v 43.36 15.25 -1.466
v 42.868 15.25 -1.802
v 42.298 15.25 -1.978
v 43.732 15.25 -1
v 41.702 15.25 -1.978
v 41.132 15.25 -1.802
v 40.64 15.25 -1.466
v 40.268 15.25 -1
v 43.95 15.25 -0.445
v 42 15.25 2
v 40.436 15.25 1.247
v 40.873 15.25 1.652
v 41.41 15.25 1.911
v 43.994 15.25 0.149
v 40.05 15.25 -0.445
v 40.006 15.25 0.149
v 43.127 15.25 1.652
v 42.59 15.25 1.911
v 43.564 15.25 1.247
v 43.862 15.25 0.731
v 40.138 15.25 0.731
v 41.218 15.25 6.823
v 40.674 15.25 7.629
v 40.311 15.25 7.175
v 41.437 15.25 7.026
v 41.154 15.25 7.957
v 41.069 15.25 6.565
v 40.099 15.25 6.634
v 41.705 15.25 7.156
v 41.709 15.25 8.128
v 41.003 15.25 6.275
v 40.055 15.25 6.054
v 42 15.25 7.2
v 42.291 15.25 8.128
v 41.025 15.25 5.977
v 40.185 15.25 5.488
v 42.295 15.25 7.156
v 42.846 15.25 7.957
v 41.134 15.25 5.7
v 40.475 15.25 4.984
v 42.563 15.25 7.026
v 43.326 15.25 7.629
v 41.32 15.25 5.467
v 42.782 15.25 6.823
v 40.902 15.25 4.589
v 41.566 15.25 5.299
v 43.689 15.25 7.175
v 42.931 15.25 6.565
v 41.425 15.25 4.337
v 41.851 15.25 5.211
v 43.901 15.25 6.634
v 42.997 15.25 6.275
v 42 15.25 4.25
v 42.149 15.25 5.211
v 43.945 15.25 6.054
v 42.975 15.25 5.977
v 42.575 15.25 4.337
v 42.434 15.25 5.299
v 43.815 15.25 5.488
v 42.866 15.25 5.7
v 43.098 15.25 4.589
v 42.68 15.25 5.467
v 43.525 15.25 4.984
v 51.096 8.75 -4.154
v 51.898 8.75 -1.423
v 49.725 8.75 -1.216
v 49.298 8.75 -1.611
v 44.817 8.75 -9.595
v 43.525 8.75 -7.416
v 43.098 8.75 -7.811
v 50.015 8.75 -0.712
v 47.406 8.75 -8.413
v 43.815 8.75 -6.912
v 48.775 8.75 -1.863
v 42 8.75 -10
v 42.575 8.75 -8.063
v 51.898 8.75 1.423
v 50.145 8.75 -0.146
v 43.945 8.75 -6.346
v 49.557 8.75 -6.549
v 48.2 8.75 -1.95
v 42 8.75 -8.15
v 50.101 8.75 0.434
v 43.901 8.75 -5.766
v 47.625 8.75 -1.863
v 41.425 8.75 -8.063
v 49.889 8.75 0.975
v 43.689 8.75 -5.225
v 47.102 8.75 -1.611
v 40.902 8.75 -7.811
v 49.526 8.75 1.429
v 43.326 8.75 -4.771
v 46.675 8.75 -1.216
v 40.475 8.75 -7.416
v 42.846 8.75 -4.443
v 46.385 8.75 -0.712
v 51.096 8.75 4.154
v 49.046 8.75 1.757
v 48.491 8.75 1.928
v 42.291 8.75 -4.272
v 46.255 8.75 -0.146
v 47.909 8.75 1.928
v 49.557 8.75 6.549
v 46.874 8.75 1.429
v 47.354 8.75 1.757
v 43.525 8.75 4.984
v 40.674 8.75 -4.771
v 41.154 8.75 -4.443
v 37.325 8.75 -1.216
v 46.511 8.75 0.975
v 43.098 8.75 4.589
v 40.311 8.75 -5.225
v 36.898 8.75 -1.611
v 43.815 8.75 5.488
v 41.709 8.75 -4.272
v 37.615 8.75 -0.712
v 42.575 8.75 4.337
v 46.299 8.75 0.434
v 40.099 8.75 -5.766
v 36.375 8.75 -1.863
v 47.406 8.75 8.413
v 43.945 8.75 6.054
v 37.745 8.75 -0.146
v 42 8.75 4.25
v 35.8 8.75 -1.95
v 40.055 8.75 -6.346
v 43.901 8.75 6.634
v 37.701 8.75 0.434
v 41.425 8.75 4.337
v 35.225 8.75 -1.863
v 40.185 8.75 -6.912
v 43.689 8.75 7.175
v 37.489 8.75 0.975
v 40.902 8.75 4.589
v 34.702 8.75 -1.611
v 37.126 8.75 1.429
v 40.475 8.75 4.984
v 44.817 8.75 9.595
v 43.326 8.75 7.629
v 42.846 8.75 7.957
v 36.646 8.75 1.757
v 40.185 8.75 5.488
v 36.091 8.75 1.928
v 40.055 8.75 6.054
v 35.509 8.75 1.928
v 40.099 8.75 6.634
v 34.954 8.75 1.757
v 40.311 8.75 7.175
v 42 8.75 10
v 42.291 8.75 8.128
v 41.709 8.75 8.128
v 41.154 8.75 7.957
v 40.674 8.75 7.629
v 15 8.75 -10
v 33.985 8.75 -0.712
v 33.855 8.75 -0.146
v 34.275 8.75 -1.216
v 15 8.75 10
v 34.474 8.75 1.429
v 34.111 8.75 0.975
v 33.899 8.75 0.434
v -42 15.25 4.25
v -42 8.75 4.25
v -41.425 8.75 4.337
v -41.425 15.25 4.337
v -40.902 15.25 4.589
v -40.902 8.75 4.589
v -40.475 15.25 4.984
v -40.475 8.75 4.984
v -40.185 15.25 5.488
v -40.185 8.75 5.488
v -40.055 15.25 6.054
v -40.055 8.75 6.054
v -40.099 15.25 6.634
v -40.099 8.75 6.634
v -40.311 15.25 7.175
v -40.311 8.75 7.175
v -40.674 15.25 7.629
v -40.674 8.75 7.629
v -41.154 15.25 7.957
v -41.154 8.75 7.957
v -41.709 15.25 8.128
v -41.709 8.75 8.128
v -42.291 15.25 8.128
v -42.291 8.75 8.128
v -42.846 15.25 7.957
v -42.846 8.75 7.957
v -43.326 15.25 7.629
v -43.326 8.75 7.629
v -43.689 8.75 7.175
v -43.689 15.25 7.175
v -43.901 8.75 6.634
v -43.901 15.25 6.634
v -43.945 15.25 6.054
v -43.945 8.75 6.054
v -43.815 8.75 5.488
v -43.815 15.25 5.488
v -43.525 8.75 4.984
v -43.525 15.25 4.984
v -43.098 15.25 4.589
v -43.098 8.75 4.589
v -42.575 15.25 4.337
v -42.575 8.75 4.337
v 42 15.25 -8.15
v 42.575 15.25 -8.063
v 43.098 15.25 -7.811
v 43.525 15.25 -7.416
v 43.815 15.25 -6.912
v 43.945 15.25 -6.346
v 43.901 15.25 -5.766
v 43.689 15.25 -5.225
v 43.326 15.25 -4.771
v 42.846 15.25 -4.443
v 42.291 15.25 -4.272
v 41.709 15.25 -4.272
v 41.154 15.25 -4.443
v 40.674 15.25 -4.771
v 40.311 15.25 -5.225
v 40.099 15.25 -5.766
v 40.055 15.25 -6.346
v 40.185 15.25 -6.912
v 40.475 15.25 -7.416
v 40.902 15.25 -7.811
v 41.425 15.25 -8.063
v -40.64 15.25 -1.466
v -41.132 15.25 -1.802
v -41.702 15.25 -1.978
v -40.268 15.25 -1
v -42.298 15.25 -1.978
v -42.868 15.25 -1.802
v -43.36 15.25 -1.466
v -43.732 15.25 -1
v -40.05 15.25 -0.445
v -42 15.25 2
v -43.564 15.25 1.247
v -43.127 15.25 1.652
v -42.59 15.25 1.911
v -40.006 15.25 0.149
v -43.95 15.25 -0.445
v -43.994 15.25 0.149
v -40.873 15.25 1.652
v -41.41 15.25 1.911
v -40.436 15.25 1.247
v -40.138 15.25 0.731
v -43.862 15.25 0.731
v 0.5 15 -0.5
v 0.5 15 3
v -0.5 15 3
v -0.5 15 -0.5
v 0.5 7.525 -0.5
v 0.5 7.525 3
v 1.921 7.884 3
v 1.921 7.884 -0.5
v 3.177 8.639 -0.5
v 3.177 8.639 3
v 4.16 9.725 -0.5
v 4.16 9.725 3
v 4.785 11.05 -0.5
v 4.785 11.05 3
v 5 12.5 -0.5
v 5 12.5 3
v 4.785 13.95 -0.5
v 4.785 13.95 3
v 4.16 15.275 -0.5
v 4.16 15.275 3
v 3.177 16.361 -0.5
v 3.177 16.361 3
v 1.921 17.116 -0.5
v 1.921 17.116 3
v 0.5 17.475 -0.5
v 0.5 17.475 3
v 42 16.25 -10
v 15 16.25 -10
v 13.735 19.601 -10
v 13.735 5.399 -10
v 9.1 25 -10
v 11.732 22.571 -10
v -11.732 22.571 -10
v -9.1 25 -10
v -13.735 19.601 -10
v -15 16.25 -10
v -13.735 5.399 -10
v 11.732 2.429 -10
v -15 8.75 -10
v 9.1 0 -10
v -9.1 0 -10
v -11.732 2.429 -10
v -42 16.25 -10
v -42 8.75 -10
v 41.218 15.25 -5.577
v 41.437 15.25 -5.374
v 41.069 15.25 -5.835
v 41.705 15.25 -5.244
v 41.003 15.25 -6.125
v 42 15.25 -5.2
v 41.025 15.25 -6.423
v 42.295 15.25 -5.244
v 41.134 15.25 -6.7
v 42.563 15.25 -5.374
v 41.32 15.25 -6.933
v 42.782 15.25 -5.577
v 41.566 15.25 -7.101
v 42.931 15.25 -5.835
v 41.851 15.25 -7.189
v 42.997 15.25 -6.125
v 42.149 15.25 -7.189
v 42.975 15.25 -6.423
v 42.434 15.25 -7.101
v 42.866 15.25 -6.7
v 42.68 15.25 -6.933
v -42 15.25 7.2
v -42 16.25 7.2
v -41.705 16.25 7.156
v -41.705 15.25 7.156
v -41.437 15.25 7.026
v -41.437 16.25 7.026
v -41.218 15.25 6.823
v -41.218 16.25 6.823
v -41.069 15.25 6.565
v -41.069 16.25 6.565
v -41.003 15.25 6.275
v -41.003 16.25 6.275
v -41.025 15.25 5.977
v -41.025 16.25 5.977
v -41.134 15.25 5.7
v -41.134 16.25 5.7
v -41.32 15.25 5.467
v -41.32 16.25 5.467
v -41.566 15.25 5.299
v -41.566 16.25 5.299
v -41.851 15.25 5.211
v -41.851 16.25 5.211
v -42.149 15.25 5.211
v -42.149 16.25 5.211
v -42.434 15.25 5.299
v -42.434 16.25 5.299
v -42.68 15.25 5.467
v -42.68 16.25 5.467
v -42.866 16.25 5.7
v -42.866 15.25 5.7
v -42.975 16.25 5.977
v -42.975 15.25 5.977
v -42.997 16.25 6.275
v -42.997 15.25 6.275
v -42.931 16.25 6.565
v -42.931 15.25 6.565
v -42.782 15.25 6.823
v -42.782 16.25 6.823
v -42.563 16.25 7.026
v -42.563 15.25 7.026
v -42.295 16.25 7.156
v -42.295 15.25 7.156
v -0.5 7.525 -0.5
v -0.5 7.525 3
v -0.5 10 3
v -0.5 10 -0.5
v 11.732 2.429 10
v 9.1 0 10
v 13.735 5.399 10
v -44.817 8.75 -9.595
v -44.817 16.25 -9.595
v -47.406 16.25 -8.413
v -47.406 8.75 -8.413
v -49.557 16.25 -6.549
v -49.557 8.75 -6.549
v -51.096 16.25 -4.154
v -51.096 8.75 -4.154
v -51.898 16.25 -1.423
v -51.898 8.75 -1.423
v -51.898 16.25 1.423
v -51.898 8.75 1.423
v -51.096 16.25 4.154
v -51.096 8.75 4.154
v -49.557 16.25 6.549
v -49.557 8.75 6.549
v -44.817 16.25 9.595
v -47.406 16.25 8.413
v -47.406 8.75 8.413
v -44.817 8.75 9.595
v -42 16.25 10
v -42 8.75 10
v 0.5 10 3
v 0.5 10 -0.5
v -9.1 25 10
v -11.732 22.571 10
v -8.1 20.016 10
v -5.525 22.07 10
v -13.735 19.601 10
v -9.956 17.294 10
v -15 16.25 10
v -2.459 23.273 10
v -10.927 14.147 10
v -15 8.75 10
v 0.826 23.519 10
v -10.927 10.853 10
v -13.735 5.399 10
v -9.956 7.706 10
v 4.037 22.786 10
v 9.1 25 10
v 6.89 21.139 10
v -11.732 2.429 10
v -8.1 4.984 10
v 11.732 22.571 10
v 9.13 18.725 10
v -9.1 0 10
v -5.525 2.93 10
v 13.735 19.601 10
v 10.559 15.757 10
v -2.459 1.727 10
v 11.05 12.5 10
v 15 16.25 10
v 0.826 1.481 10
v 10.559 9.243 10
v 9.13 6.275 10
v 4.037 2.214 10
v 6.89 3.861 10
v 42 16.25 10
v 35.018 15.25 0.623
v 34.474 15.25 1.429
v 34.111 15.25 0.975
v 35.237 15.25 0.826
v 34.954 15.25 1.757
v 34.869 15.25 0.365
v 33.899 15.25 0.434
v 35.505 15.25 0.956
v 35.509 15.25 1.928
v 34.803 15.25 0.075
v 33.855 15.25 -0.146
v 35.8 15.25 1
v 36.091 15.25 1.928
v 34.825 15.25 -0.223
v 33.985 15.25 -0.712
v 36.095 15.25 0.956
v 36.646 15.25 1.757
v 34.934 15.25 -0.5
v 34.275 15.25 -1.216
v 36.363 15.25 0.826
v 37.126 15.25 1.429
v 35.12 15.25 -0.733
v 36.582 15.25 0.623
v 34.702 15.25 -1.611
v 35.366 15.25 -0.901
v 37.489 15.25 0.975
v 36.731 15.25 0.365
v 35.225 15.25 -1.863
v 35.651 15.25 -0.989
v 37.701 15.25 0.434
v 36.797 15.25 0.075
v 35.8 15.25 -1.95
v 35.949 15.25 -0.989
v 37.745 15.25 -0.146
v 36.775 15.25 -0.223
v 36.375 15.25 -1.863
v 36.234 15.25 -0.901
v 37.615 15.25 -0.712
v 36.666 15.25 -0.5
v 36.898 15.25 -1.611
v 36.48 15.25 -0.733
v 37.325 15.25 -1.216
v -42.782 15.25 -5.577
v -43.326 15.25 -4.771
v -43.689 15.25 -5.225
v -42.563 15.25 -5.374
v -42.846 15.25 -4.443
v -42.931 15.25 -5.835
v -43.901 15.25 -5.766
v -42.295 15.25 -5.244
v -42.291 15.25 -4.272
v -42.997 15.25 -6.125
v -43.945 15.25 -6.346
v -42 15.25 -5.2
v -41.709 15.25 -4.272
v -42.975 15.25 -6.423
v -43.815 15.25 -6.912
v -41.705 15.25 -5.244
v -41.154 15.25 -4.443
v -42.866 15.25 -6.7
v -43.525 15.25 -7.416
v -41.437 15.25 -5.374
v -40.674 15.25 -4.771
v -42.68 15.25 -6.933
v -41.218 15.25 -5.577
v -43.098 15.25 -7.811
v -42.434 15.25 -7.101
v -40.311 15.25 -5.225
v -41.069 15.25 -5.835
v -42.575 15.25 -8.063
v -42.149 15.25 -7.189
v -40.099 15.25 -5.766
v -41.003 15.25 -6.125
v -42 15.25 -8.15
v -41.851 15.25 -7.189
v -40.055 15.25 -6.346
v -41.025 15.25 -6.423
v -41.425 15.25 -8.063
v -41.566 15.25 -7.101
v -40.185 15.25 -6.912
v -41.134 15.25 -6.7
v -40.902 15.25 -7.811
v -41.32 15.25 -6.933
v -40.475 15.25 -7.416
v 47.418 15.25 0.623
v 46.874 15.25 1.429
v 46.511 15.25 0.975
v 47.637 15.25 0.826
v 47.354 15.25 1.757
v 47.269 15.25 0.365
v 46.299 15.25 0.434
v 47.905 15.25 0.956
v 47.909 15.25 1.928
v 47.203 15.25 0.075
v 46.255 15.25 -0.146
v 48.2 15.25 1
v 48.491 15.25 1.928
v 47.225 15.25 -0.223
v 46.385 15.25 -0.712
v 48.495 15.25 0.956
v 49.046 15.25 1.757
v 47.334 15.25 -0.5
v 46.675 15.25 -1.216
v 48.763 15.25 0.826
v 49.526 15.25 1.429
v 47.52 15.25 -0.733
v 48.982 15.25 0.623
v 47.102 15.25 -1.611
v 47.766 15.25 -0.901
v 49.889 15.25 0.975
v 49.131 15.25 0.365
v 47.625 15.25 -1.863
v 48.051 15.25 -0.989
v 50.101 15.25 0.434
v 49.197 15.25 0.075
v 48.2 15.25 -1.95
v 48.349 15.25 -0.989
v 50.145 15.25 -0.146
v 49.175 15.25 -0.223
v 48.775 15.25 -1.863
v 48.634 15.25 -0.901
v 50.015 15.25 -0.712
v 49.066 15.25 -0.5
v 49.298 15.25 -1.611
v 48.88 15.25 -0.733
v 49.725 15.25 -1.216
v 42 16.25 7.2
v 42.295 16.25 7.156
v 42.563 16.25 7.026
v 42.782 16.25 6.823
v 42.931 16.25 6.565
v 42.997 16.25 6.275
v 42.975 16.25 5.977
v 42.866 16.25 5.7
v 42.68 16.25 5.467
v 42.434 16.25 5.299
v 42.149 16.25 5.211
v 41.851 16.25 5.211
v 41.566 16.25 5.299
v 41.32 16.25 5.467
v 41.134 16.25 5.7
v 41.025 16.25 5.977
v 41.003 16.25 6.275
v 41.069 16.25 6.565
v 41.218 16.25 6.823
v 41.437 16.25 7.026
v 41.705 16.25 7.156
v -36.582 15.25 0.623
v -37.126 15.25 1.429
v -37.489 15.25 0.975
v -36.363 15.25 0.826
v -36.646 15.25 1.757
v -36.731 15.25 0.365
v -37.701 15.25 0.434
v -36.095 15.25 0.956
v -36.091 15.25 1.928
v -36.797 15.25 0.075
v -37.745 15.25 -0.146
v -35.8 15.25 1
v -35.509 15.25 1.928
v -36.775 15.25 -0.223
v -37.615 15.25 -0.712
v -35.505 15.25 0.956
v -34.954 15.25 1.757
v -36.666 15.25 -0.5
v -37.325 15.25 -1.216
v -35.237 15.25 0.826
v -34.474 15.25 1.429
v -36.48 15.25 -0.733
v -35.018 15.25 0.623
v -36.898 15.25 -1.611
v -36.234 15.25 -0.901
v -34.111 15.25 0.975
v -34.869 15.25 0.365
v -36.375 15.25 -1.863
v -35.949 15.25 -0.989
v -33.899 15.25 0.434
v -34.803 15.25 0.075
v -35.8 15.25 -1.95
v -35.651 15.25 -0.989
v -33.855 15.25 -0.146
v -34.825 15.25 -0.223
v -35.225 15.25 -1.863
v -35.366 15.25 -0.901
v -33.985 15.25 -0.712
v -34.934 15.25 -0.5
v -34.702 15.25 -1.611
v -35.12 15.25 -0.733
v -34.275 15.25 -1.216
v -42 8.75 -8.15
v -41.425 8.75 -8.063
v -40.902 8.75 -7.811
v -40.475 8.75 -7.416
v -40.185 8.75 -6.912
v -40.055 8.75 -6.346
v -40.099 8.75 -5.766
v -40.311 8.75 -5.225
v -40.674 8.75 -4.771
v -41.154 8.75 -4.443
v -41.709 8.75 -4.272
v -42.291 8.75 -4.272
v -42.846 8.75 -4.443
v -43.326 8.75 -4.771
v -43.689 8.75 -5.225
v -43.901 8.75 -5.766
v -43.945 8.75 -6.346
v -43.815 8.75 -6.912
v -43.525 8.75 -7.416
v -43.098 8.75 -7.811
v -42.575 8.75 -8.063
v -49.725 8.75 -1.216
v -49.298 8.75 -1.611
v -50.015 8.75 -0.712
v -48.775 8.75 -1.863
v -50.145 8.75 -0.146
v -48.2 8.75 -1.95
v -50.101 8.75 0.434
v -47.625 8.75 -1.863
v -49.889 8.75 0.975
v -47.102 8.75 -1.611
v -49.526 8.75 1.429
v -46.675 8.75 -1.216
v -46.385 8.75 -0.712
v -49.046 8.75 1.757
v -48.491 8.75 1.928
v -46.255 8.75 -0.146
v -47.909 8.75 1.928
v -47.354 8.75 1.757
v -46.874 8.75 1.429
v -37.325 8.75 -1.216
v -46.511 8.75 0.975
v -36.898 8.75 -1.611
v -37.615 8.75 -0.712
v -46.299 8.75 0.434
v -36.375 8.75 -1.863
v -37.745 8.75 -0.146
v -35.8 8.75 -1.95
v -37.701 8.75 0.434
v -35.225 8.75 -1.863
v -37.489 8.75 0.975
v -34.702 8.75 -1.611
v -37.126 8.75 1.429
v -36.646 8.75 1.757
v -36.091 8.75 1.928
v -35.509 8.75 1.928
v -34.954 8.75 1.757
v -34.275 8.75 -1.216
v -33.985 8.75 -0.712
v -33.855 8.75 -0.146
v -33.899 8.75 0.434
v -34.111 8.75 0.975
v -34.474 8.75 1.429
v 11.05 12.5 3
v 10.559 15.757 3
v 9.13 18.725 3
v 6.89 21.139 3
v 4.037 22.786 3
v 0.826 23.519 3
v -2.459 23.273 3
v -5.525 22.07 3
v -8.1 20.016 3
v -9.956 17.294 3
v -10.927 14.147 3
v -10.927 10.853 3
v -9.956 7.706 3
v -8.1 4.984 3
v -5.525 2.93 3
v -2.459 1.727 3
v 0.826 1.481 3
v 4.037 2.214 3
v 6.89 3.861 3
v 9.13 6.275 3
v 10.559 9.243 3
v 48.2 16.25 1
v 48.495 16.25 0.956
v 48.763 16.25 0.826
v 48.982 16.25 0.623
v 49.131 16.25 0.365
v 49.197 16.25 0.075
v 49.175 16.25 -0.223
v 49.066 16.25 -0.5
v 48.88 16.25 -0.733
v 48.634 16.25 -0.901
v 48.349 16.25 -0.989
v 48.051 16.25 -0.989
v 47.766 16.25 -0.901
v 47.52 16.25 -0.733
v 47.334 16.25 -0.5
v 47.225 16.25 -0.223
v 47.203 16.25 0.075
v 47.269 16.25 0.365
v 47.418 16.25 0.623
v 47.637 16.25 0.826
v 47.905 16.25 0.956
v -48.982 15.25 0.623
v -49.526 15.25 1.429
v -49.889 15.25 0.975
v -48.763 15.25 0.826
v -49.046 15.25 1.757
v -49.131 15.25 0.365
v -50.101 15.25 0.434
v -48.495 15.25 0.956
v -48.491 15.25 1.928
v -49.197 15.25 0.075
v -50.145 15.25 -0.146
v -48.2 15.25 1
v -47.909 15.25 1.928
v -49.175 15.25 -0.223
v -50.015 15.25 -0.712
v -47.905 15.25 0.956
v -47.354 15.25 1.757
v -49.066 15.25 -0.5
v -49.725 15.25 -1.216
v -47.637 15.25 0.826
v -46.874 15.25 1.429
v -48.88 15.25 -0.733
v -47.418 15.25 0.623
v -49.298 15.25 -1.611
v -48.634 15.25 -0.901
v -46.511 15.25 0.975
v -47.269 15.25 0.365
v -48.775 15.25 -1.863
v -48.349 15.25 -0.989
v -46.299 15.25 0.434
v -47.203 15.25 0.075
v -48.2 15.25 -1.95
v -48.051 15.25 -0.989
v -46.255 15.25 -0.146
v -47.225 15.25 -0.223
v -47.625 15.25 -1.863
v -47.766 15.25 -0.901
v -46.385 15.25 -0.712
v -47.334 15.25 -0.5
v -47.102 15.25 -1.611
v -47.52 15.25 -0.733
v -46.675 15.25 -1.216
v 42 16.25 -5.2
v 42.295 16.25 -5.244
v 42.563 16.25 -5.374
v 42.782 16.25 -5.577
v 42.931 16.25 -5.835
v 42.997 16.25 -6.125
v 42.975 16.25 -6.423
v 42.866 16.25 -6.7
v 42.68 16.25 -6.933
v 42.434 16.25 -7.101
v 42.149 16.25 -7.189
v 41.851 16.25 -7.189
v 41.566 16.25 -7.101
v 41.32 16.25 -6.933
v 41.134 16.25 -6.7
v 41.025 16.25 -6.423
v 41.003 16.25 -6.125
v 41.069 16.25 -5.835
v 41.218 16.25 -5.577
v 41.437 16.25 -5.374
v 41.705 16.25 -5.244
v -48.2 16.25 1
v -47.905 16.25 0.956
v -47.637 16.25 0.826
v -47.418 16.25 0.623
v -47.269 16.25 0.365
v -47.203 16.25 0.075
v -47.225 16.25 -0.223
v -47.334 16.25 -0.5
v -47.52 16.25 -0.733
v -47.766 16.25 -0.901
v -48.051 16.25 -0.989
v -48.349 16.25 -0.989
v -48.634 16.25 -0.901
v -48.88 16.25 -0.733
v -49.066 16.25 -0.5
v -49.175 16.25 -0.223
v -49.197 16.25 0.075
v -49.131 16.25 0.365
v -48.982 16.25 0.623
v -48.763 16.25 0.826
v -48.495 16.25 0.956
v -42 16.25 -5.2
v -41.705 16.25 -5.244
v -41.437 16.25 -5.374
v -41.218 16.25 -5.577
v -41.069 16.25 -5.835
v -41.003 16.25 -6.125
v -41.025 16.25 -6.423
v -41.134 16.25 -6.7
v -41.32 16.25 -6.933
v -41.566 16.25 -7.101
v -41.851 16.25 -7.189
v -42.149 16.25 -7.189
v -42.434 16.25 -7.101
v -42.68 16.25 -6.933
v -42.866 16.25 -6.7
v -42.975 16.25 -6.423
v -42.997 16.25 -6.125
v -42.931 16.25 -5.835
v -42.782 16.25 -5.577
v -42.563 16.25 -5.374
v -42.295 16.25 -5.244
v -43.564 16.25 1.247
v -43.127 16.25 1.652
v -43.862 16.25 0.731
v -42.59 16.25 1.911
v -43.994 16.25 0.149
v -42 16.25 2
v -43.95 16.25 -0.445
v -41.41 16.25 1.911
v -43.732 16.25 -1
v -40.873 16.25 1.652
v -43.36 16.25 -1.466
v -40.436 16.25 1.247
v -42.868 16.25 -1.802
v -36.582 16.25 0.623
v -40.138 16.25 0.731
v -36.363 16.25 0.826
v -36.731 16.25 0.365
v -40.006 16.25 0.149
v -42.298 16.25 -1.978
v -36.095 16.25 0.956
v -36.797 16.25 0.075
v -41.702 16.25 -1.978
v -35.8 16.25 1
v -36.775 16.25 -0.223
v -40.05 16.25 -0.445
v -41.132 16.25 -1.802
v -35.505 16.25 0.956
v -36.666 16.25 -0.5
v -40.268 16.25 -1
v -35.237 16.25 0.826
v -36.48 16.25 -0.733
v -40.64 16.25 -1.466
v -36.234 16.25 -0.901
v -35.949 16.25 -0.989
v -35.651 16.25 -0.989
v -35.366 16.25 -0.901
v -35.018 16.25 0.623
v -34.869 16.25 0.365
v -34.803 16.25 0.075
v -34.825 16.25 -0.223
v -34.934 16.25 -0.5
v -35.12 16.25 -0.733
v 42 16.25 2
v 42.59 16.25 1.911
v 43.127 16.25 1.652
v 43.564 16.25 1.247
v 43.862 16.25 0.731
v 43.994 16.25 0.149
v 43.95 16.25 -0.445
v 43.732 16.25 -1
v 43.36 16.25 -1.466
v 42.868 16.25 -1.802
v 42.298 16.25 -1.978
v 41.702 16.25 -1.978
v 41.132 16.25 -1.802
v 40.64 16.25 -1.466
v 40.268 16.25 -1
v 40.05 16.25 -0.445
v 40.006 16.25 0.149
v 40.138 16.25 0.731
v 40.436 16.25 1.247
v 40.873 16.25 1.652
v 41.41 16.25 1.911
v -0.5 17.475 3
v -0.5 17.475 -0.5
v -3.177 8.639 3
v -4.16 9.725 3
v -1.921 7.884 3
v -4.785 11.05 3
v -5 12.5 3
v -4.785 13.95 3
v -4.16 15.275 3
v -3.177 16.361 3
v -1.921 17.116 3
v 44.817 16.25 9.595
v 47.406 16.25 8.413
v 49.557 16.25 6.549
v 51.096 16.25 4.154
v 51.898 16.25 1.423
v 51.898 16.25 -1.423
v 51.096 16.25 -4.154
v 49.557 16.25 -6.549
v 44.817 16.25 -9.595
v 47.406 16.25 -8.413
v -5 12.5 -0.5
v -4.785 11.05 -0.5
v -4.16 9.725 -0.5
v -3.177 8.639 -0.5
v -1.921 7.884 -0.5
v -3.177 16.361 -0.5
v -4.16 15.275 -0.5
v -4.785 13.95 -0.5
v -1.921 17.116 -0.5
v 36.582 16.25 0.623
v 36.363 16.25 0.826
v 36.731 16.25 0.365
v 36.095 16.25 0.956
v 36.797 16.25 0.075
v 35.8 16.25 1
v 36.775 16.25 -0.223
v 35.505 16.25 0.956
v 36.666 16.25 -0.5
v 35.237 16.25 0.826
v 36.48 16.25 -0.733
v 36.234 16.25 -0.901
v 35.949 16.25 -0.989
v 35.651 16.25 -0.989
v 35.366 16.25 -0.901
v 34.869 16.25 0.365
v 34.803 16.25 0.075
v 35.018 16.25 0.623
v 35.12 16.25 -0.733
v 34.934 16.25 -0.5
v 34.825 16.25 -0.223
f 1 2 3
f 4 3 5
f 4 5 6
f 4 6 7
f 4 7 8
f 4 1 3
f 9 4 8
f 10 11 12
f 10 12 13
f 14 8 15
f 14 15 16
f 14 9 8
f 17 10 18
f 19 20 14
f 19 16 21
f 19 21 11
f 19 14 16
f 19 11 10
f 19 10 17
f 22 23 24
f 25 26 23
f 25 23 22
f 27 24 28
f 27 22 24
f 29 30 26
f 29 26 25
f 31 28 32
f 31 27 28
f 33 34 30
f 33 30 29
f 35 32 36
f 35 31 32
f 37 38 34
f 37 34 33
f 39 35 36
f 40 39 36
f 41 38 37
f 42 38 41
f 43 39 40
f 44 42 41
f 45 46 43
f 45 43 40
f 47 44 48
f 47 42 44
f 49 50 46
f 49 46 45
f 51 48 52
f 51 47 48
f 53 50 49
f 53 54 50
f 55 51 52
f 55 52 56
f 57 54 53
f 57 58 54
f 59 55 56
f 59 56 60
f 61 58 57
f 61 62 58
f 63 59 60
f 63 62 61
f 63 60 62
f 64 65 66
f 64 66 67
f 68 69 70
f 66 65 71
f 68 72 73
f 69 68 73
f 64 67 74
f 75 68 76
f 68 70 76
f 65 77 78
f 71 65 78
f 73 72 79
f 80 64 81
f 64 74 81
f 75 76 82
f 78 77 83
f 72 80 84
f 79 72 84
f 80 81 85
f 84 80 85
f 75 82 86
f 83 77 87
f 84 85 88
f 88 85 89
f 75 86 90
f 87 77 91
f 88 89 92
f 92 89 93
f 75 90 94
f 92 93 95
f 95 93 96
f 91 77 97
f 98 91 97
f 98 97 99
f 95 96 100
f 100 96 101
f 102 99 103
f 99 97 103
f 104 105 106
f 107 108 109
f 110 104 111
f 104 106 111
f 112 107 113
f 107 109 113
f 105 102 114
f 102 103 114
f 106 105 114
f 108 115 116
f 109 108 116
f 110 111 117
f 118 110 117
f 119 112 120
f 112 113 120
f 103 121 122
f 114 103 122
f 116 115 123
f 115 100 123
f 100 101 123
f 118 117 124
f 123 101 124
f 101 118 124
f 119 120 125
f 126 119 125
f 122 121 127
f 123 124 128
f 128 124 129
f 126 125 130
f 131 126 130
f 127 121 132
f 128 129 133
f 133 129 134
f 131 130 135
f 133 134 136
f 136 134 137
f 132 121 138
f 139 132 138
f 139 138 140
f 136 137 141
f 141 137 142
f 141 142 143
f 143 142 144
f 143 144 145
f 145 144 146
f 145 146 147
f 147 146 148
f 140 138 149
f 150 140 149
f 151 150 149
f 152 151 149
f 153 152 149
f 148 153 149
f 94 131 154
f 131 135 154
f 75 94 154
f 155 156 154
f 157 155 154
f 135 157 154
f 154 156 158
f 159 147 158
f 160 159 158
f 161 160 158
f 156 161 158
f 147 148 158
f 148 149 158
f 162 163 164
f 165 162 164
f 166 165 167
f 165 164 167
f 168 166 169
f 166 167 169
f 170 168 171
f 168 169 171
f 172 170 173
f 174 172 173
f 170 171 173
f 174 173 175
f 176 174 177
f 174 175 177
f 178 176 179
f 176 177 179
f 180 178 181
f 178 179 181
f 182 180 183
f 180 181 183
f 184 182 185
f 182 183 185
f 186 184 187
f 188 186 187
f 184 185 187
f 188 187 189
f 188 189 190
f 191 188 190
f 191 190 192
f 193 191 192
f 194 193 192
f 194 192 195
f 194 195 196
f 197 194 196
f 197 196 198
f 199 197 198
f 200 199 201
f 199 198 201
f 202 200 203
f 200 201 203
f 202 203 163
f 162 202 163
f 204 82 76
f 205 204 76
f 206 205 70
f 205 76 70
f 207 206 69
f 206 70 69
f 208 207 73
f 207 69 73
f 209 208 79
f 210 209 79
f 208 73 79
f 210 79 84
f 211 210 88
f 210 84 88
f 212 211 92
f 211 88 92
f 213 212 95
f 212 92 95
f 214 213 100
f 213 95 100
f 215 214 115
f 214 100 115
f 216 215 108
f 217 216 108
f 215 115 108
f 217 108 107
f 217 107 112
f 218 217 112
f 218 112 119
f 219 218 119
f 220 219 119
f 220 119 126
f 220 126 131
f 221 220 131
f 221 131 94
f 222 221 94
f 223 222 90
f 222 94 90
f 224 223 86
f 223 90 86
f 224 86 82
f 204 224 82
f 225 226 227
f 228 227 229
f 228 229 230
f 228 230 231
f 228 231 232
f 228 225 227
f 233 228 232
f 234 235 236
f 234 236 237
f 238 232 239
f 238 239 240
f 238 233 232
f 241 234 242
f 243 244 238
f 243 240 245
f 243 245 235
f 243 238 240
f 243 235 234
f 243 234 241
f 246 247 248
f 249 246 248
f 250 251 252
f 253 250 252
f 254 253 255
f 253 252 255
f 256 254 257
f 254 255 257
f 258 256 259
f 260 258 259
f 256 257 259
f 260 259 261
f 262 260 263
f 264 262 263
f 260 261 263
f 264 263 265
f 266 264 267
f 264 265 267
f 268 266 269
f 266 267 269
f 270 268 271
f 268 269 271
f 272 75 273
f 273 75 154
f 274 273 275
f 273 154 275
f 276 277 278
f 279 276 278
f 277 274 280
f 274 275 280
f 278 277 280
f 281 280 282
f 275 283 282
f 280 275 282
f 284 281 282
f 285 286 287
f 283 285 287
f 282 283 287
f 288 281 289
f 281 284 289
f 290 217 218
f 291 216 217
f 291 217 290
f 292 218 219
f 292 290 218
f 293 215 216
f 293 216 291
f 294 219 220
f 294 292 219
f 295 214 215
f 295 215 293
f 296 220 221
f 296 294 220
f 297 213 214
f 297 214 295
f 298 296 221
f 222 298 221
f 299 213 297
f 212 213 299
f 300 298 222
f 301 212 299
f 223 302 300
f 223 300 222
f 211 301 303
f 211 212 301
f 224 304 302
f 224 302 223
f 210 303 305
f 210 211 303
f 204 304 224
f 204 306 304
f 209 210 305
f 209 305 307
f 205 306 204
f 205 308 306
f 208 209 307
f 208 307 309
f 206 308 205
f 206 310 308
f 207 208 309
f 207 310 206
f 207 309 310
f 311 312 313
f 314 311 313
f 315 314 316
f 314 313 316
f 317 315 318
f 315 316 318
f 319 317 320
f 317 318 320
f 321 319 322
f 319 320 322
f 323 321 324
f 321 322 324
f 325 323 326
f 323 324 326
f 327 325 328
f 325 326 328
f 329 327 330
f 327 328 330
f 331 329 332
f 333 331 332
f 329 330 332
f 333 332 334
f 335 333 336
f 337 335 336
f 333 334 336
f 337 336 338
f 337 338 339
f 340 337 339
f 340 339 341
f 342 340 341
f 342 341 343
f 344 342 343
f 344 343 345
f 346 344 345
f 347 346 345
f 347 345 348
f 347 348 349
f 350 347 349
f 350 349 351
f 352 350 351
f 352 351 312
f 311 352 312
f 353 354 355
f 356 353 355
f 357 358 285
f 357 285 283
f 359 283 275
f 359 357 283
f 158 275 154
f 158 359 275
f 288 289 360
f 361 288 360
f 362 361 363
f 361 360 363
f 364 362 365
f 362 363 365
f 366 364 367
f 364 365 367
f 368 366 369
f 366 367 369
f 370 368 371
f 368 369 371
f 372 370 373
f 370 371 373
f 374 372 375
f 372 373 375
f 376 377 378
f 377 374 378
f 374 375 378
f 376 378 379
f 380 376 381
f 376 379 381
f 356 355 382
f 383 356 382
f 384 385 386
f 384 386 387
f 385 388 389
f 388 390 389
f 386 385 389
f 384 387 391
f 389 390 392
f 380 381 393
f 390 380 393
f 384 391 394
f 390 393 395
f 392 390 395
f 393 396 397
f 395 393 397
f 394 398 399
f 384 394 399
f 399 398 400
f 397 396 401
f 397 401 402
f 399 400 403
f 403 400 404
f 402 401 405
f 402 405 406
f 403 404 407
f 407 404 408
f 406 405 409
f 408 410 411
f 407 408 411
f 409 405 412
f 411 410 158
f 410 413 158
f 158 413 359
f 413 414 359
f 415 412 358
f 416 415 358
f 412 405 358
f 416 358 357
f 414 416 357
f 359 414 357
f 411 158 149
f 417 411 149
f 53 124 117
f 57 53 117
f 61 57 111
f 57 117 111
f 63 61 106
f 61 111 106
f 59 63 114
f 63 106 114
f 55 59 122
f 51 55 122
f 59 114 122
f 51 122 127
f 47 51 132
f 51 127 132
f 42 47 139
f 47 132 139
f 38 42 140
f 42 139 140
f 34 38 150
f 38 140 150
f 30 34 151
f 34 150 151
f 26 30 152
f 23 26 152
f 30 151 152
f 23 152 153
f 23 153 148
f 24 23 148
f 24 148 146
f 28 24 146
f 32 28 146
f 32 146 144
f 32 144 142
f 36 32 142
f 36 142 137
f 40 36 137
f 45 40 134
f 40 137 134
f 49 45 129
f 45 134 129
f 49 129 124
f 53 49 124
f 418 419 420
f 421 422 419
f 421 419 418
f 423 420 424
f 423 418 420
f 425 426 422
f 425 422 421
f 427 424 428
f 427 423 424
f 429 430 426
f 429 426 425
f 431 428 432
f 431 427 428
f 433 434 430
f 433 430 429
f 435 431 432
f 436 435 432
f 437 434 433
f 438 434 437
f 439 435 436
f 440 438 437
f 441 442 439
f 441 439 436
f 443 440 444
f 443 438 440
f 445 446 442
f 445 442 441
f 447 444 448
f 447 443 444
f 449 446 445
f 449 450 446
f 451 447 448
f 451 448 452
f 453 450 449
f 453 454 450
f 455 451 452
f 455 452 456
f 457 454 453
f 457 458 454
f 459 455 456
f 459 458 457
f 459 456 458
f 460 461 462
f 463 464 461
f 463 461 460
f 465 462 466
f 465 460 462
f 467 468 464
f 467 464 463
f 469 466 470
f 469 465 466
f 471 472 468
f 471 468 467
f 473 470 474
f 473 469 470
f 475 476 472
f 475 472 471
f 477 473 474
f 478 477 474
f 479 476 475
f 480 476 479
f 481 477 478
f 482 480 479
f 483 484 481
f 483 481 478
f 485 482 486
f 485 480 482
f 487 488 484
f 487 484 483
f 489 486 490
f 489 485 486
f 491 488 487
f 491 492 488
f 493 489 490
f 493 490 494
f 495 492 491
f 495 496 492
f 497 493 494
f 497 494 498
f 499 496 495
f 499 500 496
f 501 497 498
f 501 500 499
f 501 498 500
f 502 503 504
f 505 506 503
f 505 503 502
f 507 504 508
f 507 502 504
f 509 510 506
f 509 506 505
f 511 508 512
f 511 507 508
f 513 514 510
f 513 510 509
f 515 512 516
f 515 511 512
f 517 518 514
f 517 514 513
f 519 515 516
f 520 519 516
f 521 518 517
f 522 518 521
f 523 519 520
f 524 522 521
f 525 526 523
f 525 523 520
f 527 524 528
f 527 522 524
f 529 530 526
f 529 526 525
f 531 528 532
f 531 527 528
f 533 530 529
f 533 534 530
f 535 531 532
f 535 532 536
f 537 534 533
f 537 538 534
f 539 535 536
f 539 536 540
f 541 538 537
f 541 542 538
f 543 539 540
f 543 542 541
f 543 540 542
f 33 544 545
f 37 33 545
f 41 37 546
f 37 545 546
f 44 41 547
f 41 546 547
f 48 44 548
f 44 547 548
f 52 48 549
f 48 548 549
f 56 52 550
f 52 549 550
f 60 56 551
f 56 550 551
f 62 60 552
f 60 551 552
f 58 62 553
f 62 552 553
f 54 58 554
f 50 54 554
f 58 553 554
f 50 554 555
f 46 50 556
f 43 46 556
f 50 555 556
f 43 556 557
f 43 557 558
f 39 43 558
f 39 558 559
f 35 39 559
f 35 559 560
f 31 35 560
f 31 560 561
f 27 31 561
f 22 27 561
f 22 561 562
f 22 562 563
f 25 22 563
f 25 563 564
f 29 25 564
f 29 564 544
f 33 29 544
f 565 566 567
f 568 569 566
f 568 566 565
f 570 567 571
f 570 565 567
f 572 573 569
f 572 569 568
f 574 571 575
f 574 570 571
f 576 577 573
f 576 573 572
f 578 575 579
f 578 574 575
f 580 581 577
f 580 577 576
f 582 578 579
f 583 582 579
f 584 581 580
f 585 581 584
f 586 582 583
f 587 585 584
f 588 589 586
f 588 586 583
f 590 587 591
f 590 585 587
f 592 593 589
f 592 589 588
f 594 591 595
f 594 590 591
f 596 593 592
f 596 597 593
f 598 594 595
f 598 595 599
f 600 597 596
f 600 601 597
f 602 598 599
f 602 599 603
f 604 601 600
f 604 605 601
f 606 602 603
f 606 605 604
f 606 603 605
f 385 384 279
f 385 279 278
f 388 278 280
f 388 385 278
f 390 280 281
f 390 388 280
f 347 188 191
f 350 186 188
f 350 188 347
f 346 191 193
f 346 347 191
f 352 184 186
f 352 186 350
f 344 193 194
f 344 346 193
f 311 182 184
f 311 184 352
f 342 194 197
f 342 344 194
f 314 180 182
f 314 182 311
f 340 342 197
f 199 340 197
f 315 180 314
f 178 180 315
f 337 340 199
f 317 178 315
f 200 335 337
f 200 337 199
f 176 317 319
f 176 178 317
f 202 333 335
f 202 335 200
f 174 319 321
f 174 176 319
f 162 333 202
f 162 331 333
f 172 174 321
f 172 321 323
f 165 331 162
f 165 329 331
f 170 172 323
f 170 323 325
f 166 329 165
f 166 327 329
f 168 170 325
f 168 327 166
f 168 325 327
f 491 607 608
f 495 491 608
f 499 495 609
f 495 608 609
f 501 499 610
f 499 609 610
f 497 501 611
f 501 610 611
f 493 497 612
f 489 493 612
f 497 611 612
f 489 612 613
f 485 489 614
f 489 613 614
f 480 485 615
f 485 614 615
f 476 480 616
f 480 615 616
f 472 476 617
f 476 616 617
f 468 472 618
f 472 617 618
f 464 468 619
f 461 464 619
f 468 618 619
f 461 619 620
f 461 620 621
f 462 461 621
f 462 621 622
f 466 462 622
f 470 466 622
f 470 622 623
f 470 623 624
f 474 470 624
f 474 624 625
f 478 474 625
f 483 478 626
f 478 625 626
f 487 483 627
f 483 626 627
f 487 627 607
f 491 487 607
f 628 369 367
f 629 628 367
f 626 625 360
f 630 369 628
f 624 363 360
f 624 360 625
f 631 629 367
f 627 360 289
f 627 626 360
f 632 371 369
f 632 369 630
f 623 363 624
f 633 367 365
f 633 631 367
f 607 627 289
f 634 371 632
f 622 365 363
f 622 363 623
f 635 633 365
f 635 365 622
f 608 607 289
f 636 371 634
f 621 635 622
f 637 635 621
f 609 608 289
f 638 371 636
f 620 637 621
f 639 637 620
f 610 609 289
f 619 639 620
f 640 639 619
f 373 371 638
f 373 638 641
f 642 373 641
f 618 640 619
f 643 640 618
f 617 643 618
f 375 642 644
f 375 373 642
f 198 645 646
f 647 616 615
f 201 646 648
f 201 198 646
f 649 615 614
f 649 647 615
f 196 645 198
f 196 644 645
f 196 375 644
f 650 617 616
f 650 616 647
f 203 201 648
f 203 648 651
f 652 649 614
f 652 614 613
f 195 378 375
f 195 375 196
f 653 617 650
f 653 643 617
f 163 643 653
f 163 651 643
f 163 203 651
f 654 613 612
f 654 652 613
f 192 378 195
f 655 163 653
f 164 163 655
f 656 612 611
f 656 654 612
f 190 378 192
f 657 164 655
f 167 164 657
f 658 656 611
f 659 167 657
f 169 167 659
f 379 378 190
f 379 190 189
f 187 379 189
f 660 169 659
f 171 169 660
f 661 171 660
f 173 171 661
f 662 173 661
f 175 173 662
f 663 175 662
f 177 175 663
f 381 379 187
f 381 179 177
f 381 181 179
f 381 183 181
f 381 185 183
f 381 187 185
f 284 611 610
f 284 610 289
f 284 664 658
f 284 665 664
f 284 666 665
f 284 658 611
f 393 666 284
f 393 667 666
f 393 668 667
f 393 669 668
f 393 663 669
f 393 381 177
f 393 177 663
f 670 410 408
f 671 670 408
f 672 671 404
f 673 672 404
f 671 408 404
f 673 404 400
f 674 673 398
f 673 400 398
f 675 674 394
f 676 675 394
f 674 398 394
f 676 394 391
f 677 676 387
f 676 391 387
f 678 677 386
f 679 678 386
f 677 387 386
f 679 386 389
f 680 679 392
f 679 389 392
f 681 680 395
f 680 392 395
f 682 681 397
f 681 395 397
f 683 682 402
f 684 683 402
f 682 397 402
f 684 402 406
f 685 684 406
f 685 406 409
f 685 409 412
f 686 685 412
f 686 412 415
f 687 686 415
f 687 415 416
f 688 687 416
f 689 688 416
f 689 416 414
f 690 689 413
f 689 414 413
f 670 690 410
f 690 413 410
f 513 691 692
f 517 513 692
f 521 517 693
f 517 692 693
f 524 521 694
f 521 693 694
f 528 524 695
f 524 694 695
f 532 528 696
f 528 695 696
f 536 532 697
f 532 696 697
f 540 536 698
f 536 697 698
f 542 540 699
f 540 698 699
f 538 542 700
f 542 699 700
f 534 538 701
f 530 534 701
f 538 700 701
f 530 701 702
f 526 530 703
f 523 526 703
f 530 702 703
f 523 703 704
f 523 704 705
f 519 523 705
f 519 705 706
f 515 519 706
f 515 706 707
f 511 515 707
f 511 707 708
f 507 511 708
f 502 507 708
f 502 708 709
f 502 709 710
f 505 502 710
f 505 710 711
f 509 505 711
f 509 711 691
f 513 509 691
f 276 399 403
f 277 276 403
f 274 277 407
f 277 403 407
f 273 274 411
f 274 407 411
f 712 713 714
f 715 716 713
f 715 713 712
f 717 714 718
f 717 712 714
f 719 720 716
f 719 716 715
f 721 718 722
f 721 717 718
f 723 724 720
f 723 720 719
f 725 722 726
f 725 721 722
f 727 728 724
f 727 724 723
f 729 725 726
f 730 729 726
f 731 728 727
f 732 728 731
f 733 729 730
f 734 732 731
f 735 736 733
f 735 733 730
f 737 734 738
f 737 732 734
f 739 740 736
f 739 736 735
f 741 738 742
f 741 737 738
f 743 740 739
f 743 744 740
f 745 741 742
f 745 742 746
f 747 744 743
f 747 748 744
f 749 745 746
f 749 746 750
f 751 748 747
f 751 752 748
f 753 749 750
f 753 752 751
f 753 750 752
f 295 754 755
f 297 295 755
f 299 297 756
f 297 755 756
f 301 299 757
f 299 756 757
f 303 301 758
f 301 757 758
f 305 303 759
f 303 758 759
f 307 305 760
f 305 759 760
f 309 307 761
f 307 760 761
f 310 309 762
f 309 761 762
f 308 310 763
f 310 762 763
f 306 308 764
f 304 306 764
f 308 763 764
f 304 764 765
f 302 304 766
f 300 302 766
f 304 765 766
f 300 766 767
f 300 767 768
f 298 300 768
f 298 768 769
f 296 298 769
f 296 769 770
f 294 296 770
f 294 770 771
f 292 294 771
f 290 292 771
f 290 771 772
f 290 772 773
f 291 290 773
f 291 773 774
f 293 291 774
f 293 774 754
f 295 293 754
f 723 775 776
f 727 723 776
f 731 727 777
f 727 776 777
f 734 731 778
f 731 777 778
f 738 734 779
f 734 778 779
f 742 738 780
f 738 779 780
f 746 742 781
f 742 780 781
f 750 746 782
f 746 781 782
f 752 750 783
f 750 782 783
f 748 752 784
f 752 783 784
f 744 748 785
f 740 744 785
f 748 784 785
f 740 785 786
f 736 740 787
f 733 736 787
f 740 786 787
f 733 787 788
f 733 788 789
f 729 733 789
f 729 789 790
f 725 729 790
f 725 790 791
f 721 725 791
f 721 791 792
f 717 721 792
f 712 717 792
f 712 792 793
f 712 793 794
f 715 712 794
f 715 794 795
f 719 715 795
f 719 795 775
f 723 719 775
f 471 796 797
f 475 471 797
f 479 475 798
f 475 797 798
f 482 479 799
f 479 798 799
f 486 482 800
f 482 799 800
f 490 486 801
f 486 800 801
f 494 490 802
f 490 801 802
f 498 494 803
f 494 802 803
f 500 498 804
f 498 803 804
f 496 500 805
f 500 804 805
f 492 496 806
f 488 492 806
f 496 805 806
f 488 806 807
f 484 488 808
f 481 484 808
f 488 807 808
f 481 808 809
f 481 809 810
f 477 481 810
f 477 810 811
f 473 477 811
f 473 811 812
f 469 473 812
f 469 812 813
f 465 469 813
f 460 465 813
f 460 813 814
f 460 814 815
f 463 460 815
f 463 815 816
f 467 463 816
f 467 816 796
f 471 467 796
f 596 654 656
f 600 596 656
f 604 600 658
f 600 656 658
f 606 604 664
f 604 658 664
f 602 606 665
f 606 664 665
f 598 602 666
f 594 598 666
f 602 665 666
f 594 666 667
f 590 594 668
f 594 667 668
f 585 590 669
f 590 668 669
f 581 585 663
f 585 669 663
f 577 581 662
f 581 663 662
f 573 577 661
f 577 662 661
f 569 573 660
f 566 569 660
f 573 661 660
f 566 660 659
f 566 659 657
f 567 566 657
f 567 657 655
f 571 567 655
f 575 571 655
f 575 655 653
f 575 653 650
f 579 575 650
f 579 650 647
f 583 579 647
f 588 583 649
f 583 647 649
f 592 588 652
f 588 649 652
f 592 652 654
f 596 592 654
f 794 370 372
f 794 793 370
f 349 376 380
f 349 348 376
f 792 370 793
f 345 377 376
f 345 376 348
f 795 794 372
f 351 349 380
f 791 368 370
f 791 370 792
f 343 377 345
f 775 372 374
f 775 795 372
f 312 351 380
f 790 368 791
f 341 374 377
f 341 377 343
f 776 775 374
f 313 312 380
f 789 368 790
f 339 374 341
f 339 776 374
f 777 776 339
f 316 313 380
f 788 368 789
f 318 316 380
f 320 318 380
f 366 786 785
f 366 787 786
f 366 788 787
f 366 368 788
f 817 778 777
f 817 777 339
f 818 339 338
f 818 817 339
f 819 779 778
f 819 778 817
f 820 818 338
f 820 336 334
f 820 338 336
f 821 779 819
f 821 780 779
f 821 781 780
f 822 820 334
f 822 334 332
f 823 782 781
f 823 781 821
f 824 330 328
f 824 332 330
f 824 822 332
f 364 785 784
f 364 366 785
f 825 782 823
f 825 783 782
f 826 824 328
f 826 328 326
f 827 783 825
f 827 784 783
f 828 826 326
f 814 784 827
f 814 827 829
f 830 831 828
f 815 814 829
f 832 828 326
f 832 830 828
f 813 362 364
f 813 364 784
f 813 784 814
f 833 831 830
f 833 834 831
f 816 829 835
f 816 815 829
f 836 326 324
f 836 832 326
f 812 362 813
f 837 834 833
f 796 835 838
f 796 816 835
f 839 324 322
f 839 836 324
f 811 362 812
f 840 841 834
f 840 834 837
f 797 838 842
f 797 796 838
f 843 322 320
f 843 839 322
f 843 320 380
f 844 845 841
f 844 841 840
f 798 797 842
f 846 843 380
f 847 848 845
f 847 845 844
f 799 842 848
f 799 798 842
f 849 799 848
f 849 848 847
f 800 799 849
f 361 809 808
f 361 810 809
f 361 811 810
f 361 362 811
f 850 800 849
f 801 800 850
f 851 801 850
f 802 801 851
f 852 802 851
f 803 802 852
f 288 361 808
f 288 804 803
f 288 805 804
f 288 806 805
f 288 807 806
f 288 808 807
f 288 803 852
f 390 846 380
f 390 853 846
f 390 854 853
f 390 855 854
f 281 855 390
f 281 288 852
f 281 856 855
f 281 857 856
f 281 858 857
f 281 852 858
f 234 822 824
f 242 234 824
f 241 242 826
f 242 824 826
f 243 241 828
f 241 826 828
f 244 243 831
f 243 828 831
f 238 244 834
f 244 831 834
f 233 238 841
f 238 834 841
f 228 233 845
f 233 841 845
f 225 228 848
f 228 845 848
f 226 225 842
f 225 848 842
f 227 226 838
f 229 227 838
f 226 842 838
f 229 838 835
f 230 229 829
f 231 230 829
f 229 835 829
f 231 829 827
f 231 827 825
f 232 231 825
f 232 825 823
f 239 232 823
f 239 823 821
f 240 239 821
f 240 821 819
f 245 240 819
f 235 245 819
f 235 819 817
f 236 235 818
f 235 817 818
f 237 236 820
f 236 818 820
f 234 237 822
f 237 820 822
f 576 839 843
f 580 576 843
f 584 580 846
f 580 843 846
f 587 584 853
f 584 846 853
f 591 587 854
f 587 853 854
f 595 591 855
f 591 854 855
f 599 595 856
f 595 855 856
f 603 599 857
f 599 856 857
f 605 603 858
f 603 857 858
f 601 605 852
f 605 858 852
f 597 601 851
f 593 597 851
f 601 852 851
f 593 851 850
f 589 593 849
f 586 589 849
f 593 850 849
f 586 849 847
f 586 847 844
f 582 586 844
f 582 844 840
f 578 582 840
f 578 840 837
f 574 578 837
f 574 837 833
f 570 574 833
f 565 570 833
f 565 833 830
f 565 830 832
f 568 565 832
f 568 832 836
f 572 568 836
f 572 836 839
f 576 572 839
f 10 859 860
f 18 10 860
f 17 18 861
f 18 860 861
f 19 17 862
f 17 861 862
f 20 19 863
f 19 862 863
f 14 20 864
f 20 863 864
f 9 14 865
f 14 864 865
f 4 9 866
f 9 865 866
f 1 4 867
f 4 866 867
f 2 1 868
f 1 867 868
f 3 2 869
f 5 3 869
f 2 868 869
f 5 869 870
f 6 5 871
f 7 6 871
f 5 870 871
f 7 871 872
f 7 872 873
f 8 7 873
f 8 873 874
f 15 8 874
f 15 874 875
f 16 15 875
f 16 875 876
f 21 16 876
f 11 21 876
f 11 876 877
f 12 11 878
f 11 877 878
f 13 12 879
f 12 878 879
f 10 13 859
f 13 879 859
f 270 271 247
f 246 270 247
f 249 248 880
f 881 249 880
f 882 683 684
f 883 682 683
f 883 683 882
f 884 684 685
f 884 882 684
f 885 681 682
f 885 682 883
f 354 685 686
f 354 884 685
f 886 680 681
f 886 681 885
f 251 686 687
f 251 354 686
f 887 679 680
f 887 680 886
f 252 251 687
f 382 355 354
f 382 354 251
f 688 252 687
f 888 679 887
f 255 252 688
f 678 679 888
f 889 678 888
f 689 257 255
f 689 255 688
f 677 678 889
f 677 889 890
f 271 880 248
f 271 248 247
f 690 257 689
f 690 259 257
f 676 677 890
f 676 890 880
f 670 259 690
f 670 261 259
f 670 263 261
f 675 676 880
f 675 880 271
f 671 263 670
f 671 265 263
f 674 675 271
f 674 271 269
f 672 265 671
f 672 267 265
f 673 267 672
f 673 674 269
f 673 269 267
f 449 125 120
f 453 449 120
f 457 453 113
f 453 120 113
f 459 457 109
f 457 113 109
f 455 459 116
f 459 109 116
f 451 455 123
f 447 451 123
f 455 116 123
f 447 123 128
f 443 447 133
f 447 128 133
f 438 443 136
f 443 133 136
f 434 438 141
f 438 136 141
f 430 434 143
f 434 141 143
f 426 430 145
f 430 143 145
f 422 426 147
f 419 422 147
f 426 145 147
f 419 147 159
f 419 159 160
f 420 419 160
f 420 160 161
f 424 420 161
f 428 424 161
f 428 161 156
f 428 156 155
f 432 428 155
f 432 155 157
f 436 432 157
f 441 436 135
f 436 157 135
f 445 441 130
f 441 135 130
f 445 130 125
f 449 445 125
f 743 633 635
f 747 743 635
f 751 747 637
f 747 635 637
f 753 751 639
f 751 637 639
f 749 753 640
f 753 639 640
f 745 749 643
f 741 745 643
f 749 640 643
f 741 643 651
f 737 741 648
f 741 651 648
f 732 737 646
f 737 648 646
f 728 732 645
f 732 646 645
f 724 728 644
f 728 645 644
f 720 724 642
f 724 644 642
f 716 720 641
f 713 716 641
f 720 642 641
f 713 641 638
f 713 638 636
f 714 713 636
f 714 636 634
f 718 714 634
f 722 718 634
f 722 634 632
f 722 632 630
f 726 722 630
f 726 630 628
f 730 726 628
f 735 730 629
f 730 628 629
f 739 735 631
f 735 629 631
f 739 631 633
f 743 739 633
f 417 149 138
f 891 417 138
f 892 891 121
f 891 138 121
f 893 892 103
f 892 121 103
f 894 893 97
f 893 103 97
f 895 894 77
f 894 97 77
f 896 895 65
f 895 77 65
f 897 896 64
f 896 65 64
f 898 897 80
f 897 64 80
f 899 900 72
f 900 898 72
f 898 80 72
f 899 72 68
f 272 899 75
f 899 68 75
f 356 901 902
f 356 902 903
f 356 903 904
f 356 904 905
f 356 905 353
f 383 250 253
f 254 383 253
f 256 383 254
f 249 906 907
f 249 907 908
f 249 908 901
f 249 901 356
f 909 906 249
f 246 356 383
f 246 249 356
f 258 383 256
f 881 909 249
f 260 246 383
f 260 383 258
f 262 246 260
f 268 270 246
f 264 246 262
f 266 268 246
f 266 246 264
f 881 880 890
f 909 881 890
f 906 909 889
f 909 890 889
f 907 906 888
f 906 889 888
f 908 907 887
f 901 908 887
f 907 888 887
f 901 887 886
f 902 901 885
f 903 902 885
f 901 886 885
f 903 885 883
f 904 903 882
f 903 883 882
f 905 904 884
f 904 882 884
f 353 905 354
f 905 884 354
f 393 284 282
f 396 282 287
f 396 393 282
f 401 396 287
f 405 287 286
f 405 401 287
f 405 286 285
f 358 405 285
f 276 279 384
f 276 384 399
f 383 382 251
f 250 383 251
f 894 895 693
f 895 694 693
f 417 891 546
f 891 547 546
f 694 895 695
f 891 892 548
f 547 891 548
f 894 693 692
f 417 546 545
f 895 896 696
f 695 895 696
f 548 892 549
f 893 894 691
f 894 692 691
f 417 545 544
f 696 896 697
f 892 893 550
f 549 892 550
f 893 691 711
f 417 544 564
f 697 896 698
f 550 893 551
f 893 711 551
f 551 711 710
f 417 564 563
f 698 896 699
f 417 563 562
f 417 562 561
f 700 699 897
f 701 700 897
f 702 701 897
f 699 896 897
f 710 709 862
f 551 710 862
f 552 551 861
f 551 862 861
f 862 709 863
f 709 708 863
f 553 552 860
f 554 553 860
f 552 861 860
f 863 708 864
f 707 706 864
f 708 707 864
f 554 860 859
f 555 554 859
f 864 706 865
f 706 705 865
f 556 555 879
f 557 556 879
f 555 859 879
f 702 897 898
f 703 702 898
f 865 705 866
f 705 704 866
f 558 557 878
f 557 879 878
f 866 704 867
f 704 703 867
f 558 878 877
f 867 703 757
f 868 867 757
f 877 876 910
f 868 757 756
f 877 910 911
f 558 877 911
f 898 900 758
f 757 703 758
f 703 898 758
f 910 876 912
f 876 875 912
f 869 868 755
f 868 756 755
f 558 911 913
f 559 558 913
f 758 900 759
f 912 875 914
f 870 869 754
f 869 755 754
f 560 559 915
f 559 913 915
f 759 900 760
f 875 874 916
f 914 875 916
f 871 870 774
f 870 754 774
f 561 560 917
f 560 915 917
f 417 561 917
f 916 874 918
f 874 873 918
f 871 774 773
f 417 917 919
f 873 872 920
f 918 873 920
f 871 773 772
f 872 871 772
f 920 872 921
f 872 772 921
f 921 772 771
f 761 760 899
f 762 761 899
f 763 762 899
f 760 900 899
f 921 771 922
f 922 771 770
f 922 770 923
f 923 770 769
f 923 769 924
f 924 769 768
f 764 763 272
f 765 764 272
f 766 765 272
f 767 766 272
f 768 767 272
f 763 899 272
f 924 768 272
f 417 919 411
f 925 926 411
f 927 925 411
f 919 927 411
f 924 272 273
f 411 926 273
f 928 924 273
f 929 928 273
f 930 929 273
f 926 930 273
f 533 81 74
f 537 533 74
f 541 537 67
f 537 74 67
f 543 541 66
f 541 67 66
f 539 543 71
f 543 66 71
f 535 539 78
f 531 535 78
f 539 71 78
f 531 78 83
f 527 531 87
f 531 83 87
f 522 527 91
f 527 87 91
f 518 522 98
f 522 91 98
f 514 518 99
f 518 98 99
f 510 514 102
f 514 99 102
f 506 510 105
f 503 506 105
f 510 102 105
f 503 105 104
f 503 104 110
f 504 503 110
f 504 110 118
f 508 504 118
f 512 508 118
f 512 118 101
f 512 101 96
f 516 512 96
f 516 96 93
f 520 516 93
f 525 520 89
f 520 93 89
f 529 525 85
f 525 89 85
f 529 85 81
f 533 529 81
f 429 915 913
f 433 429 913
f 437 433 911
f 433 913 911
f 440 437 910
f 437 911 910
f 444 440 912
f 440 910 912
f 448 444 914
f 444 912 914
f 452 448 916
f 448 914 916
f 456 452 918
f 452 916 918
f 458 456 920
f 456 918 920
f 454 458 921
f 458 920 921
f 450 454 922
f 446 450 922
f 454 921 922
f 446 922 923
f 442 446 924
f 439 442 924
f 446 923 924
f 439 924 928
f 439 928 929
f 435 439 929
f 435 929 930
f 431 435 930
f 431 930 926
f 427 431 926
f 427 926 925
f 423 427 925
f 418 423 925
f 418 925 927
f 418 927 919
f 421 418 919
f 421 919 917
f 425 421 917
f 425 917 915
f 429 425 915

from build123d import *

# Parameters (mm, degrees)
BOSS_EXTRUDE1_DEPTH = 25
SKETCH2_R           = 11.05
CUT_EXTRUDE1_DEPTH  = 7
CUT_EXTRUDE3_DEPTH  = 8.75
CUT_EXTRUDE5_DEPTH  = 8.75
SKETCH5_R           = 1
CUT_EXTRUDE6_DEPTH  = 7.5
SKETCH6_R           = 1.95
CUT_EXTRUDE7_DEPTH  = 6.5
SKETCH7_R           = 2
CUT_EXTRUDE8_DEPTH  = 1
CUT_EXTRUDE9_DEPTH  = 62.065538563
CUT_EXTRUDE10_DEPTH = 3.5


with BuildPart() as part:
    # Sketch1 → Boss-Extrude1 (new body)
    with BuildSketch(Plane(origin=(0, 0, 0), x_dir=(1, 0, 0), z_dir=(0, 1, 0))):
        with BuildLine():
            Line((-42, -10), (42, -10))
            ThreePointArc((42, -10), (52, 0), (42, 10))
            Line((42, 10), (-42, 10))
            ThreePointArc((-42, 10), (-52, 0), (-42, -10))
        make_face()
    extrude(amount=BOSS_EXTRUDE1_DEPTH)

    # Sketch2 → Cut-Extrude1 (cut)
    with BuildSketch(Plane.XY.offset(10)):
        with Locations((0, 12.5)):
            Circle(SKETCH2_R)
    extrude(amount=-CUT_EXTRUDE1_DEPTH, mode=Mode.SUBTRACT)

    # Sketch3 → Cut-Extrude3 (cut)
    with BuildSketch(Plane.XZ):
        with BuildLine():
            Line((15, -10), (15, 10))
            Line((15, 10), (42, 10))
            ThreePointArc((42, 10), (52, 0), (42, -10))
            Line((42, -10), (15, -10))
        make_face()
        with BuildLine():
            Line((-15, -10), (-15, 10))
            Line((-15, 10), (-42, 10))
            ThreePointArc((-42, 10), (-52, 0), (-42, -10))
            Line((-42, -10), (-15, -10))
        make_face()
    extrude(amount=-CUT_EXTRUDE3_DEPTH, mode=Mode.SUBTRACT)

    # Sketch4 → Cut-Extrude5 (cut)
    with BuildSketch(Plane(origin=(0, 25, 0), x_dir=(1, 0, 0), z_dir=(0, 1, 0))):
        with BuildLine():
            Line((15, -10), (15, 10))
            Line((15, 10), (55, 10))
            ThreePointArc((55, 10), (65, 0), (55, -10))
            Line((55, -10), (15, -10))
        make_face()
        with BuildLine():
            Line((-15, -10), (-15, 10))
            Line((-15, 10), (-55, 10))
            ThreePointArc((-55, 10), (-65, 0), (-55, -10))
            Line((-55, -10), (-15, -10))
        make_face()
    extrude(amount=-CUT_EXTRUDE5_DEPTH, mode=Mode.SUBTRACT)

    # Sketch5 → Cut-Extrude6 (cut)
    with BuildSketch(Plane(origin=(0, 16.25, 0), x_dir=(1, 0, 0), z_dir=(0, 1, 0))):
        with Locations(Location((-42, 6.2, 0), (0, 0, 270))):
            Circle(SKETCH5_R)
        with Locations(Location((-35.8, 0, 0), (0, 0, 270))):
            Circle(SKETCH5_R)
        with Locations(Location((-42, -6.2, 0), (0, 0, 270))):
            Circle(SKETCH5_R)
        with Locations(Location((-48.2, 0, 0), (0, 0, 270))):
            Circle(SKETCH5_R)
        with Locations(Location((42, 6.2, 0), (0, 0, 270))):
            Circle(SKETCH5_R)
        with Locations(Location((48.2, 0, 0), (0, 0, 270))):
            Circle(SKETCH5_R)
        with Locations(Location((42, -6.2, 0), (0, 0, 270))):
            Circle(SKETCH5_R)
        with Locations(Location((35.8, 0, 0), (0, 0, 270))):
            Circle(SKETCH5_R)
    extrude(amount=-CUT_EXTRUDE6_DEPTH, mode=Mode.SUBTRACT)

    # Sketch6 → Cut-Extrude7 (cut)
    with BuildSketch(Plane.XZ.offset(-8.75)):
        with Locations(Location((-42, 6.2, 0), (0, 0, 270))):
            Circle(SKETCH6_R)
        with Locations(Location((-35.8, 0, 0), (0, 0, 270))):
            Circle(SKETCH6_R)
        with Locations(Location((-48.2, 0, 0), (0, 0, 270))):
            Circle(SKETCH6_R)
        with Locations(Location((-42, -6.2, 0), (0, 0, 270))):
            Circle(SKETCH6_R)
        with Locations(Location((42, 6.2, 0), (0, 0, 270))):
            Circle(SKETCH6_R)
        with Locations(Location((48.2, 0, 0), (0, 0, 270))):
            Circle(SKETCH6_R)
        with Locations(Location((35.8, 0, 0), (0, 0, 270))):
            Circle(SKETCH6_R)
        with Locations(Location((42, -6.2, 0), (0, 0, 270))):
            Circle(SKETCH6_R)
    extrude(amount=-CUT_EXTRUDE7_DEPTH, mode=Mode.SUBTRACT)

    # Sketch7 → Cut-Extrude8 (cut)
    with BuildSketch(Plane(origin=(0, 16.25, 0), x_dir=(1, 0, 0), z_dir=(0, 1, 0))):
        with Locations(Location((-42, 0, 0), (0, 0, 270))):
            Circle(SKETCH7_R)
        with Locations(Location((42, 0, 0), (0, 0, 270))):
            Circle(SKETCH7_R)
    extrude(amount=-CUT_EXTRUDE8_DEPTH, mode=Mode.SUBTRACT)

    # Sketch8 → Cut-Extrude9 (cut, through all)
    with BuildSketch(Plane.XY.offset(10)):
        with BuildLine():
            Line((-15, 16.25), (-15, 25))
            Line((-15, 25), (-9.100137362, 25))
            ThreePointArc((-9.100137362, 25), (-12.819702813, 21.143941218), (-15, 16.25))
        make_face()
        with BuildLine():
            Line((15, 0), (9.100137362, 0))
            ThreePointArc((9.100137362, 0), (12.819702813, 3.856058782), (15, 8.75))
            Line((15, 8.75), (15, 0))
        make_face()
        with BuildLine():
            Line((15, 25), (9.100137362, 25))
            ThreePointArc((9.100137362, 25), (12.819702813, 21.143941218), (15, 16.25))
            Line((15, 16.25), (15, 25))
        make_face()
        with BuildLine():
            Line((-15, 0), (-15, 8.75))
            ThreePointArc((-15, 8.75), (-12.819702813, 3.856058782), (-9.100137362, 0))
            Line((-9.100137362, 0), (-15, 0))
        make_face()
    extrude(amount=-CUT_EXTRUDE9_DEPTH, mode=Mode.SUBTRACT)

    # Sketch9 → Cut-Extrude10 (cut)
    with BuildSketch(Plane.XY.offset(3)):
        with BuildLine():
            Line((0.5, 10), (0.5, 7.525062814))
            ThreePointArc((0.5, 7.525062814), (5, 12.5), (0.5, 17.474937186))
            Line((0.5, 17.474937186), (0.5, 15))
            Line((0.5, 15), (-0.5, 15))
            Line((-0.5, 15), (-0.5, 17.474937186))
            ThreePointArc((-0.5, 17.474937186), (-5, 12.5), (-0.5, 7.525062814))
            Line((-0.5, 7.525062814), (-0.5, 10))
            Line((-0.5, 10), (0.5, 10))
        make_face()
    extrude(amount=-CUT_EXTRUDE10_DEPTH, mode=Mode.SUBTRACT)


solid = part.part
